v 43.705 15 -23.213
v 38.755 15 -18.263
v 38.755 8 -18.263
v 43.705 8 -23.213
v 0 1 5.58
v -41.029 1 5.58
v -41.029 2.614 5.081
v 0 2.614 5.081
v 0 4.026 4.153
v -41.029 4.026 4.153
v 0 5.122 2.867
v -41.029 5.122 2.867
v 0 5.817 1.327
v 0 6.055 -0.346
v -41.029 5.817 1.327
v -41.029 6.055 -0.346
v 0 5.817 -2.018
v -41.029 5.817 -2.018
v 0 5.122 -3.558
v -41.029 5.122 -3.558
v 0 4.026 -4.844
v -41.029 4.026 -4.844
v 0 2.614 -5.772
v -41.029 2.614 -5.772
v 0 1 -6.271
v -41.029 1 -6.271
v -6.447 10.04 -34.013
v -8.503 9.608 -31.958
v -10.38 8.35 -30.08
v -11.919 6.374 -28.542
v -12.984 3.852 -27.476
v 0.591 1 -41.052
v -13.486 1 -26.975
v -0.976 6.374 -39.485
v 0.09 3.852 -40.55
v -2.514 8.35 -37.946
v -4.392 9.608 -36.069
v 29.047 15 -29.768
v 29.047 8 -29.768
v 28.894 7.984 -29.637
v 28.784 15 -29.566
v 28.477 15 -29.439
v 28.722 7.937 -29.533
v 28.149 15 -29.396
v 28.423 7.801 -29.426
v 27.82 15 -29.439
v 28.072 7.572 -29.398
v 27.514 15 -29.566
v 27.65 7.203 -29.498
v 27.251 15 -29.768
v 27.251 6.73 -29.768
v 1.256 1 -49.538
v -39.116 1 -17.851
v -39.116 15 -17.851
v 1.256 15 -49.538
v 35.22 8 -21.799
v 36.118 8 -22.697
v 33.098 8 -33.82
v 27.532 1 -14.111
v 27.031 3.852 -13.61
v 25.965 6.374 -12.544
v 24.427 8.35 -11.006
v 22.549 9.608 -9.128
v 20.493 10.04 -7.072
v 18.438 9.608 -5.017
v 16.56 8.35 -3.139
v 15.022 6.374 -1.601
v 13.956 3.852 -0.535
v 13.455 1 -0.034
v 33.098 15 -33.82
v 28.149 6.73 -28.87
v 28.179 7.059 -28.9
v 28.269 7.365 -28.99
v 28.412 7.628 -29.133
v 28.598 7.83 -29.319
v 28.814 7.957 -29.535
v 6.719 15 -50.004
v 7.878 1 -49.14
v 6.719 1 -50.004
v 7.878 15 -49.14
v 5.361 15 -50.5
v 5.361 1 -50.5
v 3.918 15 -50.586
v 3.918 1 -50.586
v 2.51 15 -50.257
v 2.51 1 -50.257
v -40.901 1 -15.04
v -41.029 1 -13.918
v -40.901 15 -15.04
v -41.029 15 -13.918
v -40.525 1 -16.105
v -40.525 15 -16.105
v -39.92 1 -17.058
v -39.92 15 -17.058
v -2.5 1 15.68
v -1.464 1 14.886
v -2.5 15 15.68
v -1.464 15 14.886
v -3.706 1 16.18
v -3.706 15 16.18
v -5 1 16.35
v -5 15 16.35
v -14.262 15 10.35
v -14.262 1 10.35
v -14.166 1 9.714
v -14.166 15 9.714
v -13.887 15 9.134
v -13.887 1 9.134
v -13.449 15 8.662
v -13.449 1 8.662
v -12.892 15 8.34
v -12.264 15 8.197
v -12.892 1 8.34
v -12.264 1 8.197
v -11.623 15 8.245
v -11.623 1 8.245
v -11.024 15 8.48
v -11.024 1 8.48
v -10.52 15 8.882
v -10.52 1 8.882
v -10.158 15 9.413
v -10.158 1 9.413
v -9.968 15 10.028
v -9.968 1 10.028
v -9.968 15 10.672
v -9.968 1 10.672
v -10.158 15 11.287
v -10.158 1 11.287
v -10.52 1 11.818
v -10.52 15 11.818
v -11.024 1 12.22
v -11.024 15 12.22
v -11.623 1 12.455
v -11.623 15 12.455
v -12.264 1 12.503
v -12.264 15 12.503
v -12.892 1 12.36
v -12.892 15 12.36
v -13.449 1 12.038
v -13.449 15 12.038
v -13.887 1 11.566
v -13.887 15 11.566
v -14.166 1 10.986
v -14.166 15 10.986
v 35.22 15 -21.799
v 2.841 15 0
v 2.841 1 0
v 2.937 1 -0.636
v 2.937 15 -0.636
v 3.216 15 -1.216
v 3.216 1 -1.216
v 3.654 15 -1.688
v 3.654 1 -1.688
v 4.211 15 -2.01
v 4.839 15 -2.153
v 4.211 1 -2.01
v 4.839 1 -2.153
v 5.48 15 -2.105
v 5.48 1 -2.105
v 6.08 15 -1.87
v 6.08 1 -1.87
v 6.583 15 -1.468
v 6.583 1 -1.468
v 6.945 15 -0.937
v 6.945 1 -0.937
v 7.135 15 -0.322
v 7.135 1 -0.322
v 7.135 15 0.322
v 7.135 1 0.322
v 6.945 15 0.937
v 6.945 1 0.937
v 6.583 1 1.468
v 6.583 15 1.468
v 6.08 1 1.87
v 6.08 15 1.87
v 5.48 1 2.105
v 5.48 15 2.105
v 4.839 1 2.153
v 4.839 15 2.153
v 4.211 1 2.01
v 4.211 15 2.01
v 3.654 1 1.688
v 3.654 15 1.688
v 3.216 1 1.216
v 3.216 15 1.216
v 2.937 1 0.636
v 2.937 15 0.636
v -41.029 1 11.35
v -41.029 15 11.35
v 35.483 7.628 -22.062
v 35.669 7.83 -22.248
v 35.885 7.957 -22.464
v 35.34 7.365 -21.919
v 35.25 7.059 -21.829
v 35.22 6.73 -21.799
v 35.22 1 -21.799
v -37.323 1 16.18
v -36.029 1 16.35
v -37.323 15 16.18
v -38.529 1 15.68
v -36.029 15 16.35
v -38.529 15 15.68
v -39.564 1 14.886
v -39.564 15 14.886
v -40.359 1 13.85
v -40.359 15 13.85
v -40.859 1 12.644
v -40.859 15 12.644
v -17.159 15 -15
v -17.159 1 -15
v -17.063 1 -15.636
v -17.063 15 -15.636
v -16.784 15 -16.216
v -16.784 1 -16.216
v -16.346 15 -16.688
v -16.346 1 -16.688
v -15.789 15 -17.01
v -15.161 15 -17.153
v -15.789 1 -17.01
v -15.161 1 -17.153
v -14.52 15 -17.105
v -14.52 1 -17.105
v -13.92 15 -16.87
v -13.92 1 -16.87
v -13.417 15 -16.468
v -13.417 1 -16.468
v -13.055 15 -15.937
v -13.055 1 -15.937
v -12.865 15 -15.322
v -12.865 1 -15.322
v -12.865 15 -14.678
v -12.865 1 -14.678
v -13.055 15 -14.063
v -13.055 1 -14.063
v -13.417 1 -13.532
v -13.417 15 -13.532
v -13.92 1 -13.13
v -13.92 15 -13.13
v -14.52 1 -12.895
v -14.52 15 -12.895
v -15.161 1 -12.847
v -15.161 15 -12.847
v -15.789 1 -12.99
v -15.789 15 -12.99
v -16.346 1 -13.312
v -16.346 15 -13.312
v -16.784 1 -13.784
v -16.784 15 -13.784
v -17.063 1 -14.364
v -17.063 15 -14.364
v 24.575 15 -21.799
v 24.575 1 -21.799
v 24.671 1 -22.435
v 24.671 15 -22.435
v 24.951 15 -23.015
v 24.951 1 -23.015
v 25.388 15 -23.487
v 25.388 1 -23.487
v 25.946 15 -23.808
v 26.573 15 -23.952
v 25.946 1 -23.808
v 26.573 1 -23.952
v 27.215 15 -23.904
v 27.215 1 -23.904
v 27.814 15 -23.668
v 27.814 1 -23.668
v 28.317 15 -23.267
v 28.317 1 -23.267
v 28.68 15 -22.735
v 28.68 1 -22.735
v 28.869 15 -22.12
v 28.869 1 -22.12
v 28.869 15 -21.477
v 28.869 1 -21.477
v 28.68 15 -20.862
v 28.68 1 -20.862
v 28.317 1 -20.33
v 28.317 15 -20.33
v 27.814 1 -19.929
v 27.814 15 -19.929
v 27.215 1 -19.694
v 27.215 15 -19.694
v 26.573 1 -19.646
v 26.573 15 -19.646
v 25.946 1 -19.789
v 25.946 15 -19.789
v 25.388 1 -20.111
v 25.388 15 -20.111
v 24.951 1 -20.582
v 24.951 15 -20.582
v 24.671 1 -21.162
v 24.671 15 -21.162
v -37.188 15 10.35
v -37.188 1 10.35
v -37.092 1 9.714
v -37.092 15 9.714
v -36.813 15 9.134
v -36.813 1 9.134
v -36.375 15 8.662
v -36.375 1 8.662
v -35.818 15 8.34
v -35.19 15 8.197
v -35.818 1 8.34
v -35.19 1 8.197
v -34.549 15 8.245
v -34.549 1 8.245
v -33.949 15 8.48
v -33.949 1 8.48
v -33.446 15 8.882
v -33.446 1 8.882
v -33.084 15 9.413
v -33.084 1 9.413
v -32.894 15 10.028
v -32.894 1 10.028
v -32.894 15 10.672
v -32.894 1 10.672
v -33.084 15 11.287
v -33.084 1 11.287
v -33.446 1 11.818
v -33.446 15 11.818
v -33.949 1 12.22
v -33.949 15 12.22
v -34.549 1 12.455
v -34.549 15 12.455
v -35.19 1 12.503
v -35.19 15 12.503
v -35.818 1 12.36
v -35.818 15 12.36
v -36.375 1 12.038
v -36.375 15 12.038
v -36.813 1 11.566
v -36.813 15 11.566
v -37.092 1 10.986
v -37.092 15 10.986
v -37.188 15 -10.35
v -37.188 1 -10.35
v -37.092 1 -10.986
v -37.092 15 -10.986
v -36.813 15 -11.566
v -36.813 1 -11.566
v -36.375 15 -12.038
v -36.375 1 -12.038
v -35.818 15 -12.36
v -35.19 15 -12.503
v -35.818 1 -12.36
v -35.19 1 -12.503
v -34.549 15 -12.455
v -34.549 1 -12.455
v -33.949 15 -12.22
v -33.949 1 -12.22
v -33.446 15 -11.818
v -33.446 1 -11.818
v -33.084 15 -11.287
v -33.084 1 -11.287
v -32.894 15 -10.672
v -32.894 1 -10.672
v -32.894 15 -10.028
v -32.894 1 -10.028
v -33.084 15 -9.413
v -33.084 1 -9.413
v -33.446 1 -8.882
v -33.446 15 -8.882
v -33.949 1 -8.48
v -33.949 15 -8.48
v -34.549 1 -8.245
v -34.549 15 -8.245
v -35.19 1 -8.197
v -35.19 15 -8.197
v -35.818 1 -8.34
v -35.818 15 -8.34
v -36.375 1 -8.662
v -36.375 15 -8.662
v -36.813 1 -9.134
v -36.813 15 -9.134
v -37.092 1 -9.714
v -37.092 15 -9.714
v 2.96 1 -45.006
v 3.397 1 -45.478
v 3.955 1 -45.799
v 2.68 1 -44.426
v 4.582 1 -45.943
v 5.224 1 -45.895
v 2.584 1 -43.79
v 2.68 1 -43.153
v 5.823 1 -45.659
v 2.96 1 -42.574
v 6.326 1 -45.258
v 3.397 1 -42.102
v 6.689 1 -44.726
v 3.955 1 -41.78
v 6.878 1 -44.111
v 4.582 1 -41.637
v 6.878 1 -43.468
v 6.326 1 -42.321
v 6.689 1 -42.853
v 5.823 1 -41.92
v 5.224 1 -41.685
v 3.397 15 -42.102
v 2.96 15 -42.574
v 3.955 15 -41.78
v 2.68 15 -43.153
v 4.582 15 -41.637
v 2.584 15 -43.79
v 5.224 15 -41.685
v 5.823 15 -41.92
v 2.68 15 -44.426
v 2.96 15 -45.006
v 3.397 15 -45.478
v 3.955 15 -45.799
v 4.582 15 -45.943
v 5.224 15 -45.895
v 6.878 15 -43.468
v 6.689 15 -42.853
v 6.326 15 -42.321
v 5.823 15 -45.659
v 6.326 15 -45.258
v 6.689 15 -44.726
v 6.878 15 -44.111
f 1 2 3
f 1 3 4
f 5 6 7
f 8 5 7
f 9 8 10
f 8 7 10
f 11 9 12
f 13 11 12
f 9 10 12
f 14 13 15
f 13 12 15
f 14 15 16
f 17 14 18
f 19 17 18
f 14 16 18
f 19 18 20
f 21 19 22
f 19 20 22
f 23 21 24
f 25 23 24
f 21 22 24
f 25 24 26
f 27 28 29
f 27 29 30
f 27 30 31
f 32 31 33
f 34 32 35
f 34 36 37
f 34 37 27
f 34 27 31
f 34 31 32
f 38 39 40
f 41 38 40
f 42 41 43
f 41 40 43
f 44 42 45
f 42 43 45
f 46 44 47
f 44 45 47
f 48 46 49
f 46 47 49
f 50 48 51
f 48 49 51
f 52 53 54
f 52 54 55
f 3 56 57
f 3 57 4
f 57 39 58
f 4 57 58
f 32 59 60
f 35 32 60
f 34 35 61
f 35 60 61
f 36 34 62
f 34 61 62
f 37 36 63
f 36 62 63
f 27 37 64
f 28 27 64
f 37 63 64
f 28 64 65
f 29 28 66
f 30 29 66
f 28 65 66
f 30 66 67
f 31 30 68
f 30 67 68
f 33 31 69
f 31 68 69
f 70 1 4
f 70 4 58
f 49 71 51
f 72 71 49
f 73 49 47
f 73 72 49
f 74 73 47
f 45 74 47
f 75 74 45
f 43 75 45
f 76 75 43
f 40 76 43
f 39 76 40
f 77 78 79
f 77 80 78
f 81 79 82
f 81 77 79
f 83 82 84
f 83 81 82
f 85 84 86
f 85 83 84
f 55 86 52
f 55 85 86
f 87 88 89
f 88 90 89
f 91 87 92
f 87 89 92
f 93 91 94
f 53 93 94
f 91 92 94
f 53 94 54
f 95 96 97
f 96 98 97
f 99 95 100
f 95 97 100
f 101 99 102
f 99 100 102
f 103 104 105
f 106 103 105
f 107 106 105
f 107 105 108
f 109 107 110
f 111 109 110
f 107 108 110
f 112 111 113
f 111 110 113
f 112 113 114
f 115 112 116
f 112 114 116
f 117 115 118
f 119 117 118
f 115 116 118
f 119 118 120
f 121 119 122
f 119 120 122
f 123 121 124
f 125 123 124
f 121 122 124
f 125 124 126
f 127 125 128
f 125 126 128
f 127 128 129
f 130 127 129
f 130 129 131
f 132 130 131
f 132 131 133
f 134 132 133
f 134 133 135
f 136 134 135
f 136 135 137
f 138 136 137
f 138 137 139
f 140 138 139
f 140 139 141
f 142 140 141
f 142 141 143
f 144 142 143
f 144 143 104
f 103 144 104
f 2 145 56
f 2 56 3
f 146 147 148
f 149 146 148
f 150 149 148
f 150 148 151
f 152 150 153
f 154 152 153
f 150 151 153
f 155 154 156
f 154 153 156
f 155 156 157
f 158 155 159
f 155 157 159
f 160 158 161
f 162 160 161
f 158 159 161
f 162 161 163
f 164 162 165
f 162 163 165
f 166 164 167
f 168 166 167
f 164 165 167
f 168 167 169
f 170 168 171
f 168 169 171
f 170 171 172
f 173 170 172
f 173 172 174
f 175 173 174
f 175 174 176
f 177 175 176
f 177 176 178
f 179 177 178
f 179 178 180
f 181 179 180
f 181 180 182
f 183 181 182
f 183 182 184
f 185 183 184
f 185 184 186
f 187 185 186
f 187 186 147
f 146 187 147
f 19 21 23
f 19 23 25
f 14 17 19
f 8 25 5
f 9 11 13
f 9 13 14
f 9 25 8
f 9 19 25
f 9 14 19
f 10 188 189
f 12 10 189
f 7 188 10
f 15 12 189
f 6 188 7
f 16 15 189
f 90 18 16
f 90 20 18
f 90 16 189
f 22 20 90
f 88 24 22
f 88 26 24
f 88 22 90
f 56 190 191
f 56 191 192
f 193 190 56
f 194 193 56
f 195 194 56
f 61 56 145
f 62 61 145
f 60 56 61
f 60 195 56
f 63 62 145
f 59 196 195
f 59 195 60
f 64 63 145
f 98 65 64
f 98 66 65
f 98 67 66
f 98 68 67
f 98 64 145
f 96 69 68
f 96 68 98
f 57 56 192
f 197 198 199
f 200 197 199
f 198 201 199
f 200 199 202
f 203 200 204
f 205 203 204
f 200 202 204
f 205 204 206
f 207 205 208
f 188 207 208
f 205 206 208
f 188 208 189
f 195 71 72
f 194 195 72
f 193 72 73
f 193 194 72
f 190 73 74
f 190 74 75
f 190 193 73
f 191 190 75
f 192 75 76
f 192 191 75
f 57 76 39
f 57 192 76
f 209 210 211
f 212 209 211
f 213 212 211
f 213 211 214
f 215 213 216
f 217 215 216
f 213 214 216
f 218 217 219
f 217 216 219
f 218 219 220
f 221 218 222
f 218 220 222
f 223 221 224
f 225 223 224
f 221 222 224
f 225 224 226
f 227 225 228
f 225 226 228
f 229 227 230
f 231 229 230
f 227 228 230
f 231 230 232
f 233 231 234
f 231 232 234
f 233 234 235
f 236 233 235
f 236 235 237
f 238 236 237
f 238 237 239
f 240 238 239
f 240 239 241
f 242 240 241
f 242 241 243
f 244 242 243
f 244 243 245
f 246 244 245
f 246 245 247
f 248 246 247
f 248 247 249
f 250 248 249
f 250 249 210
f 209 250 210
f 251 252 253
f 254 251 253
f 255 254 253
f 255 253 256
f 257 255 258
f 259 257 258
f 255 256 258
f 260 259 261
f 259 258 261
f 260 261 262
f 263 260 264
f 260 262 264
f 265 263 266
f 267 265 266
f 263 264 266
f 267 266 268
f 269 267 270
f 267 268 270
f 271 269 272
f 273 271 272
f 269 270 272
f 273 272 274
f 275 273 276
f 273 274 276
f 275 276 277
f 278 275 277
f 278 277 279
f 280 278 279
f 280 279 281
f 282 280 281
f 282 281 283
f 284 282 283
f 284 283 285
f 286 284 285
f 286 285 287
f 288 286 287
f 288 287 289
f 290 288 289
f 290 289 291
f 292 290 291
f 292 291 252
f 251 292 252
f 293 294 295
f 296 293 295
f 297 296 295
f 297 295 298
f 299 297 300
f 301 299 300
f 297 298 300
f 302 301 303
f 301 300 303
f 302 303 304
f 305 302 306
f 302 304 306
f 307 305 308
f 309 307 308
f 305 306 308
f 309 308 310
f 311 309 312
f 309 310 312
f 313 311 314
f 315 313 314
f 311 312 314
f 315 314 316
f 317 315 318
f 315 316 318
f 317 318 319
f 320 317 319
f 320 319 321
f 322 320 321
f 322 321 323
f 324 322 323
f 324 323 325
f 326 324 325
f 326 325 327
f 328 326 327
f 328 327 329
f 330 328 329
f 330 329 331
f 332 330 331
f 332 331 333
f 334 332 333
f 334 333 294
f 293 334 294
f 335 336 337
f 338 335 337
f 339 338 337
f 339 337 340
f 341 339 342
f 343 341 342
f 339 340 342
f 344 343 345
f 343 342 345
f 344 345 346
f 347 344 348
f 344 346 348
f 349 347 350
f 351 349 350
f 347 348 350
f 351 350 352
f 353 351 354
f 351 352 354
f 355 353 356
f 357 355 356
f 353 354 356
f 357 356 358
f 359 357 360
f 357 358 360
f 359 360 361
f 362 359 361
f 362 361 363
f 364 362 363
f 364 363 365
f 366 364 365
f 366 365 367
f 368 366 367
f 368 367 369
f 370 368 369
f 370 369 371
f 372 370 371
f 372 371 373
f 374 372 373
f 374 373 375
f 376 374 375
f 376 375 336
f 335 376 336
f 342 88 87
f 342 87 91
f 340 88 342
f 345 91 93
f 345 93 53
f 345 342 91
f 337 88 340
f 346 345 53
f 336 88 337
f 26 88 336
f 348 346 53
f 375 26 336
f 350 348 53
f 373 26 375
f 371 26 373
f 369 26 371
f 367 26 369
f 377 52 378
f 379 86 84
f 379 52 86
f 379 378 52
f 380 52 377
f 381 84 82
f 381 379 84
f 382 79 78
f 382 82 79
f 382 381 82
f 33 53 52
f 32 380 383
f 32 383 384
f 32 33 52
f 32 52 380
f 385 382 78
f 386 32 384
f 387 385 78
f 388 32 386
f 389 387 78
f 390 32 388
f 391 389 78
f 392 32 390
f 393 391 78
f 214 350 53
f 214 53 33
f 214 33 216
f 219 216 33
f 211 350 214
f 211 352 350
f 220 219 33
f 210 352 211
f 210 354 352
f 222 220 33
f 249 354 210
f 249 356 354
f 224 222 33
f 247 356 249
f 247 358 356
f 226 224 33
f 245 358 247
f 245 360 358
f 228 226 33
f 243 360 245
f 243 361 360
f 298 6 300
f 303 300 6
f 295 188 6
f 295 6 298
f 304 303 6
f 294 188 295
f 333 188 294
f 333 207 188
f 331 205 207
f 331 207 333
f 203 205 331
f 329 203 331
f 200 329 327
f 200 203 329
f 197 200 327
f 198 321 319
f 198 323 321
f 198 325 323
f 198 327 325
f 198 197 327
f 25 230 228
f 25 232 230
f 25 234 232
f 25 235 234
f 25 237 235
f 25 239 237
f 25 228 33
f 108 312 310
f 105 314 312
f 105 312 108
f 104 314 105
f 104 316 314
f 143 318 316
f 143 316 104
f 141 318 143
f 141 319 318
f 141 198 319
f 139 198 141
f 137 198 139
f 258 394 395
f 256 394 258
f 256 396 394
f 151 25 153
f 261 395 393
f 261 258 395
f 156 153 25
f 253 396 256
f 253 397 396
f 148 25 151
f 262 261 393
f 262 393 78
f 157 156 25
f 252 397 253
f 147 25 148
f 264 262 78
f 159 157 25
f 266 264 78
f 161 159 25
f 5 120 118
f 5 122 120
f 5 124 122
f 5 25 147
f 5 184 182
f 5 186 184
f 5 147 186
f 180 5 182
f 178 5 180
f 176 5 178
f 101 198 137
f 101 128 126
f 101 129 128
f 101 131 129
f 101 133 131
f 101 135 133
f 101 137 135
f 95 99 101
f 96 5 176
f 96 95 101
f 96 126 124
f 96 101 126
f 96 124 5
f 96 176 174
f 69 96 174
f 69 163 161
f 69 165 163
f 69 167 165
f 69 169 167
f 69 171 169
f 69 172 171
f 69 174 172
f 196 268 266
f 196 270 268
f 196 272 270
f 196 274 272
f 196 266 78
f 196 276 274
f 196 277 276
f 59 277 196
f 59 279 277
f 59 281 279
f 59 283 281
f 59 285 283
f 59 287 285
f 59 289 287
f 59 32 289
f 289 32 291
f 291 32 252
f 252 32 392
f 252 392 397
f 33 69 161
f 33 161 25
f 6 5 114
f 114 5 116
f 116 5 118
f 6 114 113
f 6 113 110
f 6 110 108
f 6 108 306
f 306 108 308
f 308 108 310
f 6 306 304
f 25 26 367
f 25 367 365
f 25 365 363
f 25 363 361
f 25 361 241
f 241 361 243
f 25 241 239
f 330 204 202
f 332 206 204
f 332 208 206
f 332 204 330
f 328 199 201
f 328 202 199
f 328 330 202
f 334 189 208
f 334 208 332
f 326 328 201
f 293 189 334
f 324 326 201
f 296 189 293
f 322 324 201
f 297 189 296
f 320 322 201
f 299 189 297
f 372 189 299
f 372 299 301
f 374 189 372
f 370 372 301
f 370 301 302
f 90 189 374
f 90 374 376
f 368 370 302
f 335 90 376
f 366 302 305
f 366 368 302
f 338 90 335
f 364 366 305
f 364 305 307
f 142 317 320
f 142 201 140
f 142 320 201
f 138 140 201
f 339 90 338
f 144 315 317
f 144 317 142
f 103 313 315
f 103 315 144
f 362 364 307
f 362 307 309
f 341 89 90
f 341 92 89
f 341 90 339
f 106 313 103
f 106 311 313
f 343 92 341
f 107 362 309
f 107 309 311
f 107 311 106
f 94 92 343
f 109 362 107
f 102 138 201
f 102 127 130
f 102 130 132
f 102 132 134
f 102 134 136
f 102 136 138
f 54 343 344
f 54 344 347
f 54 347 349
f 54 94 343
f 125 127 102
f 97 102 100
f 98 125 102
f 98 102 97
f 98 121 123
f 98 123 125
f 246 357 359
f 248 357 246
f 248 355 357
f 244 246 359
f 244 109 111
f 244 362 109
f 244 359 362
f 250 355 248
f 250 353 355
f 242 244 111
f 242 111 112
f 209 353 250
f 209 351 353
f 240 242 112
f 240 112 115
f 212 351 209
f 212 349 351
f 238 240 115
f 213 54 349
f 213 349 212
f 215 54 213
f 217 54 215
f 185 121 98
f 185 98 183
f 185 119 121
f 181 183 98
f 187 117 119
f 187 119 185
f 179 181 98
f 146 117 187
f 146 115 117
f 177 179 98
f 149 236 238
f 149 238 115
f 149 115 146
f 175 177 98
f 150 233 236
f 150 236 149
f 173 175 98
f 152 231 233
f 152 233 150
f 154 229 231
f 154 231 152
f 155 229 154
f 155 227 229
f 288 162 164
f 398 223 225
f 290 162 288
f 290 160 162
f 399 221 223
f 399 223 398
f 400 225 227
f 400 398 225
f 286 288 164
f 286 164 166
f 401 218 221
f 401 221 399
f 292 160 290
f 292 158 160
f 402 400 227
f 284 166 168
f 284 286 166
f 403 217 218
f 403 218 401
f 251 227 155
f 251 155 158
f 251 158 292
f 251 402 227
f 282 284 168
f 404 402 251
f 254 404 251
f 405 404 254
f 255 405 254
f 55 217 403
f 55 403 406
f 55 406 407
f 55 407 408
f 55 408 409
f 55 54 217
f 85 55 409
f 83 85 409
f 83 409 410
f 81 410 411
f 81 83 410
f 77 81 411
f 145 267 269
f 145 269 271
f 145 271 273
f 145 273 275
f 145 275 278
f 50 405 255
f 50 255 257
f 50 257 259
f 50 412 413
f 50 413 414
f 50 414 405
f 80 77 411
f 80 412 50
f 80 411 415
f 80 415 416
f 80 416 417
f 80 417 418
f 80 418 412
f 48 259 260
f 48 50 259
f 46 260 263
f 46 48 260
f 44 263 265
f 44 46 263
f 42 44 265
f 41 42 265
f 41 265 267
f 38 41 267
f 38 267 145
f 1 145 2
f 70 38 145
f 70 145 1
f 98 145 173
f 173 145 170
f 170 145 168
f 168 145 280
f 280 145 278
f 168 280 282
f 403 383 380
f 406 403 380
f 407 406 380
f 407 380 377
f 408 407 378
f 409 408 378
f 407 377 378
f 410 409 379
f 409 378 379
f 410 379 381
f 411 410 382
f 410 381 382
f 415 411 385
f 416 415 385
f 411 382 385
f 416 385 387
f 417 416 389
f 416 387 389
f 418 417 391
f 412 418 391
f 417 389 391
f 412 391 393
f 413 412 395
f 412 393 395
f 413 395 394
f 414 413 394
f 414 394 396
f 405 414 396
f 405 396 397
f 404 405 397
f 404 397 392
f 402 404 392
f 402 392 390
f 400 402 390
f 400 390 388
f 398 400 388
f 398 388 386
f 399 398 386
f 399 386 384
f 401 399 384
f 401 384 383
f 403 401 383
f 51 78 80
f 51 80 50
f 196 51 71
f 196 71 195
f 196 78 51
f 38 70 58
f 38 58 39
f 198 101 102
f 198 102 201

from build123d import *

# Parameters (mm, degrees)
EXTRUDE_1_DEPTH        = 14
EXTRUDE_2_DEPTH        = 7
CUT_EXTRUDE_1_DEPTH    = 38.1
CUT_EXTRUDE_2_DEPTH    = 41.028932188
HOLE_WIZARD_M4_1_D     = 4.318
HOLE_WIZARD_M4_1_DEPTH = 14
FILLET_1_R             = 5
FILLET_3_R             = 1.27
FILLET_4_R             = 1.27


with BuildPart() as part:
    # 草图1 → 凸台-拉伸1 (new body)
    with BuildSketch(Plane.XZ.offset(-1)):
        Polygon((4.743453393, -52.27499012), (35.219755662, -21.79868785), (-2.928932188, 16.35), (-41.028932188, 16.35), (-41.028932188, -16.35), align=None)
    extrude(amount=-EXTRUDE_1_DEPTH)

    # 草图2 → 凸台-拉伸2 (add)
    with BuildSketch(Plane(origin=(0, 15, 0), x_dir=(1, 0, 0), z_dir=(0, 1, 0))):
        Polygon((35.219755662, 21.79868785), (38.755289568, 18.263153944), (43.705037037, 23.212901413), (33.098435319, 33.819503131), (28.14868785, 28.869755662), align=None)
    extrude(amount=-EXTRUDE_2_DEPTH)

    # 草图3 → 切除-拉伸1 (cut)
    with BuildSketch(Plane(origin=(6.710533906, 0, 6.710533906), x_dir=(0.707106781, 0, -0.707106781), z_dir=(0.707106781, 0, 0.707106781))):
        with BuildLine():
            Line((9.538251542, 1), (29.445830798, 1))
            ThreePointArc((29.445830798, 1), (19.49204117, 10.039754177), (9.538251542, 1))
        make_face()
    extrude(amount=-CUT_EXTRUDE_1_DEPTH, mode=Mode.SUBTRACT)

    # 草图4 → 切除-拉伸2 (cut)
    with BuildSketch(Plane.ZY.offset(41.028932188)):
        with BuildLine():
            Line((-6.270765504, 1), (5.579500015, 1))
            ThreePointArc((5.579500015, 1), (-0.345632744, 6.05511811), (-6.270765504, 1))
        make_face()
    extrude(amount=-CUT_EXTRUDE_2_DEPTH, mode=Mode.SUBTRACT)

    # M4 间隙孔1
    with Locations(Plane(origin=(0, 15, 0), x_dir=(1, 0, 0), z_dir=(0, 1, 0))):
        with Locations((-35.028932188, -10.35), (5, 0), (-15, 15), (-12.103043109, -10.35), (-35.028932188, 10.35), (4.743453393, 43.789708745), (26.734474288, 21.79868785)):
            Hole(HOLE_WIZARD_M4_1_D / 2, depth=HOLE_WIZARD_M4_1_DEPTH)

    # 圆角1
    fillet_1_edges = [part.edges().sort_by_distance(p)[0] for p in [
        (-41.028932188, 8, -16.35),
        (-41.028932188, 8, 16.35),
        (-2.928932188, 8, 16.35),
        (4.743453393, 8, -52.27499012),
    ]]
    fillet(fillet_1_edges, radius=FILLET_1_R)

    # 圆角3
    fillet_3_edges = [part.edges().sort_by_distance(p)[0] for p in [
        (28.14868785, 11.5, -28.869755662),
    ]]
    fillet(fillet_3_edges, radius=FILLET_3_R)

    # 圆角4
    fillet_4_edges = [part.edges().sort_by_distance(p)[0] for p in [
        (31.684221756, 8, -25.334221756),
    ]]
    fillet(fillet_4_edges, radius=FILLET_4_R)


solid = part.part
